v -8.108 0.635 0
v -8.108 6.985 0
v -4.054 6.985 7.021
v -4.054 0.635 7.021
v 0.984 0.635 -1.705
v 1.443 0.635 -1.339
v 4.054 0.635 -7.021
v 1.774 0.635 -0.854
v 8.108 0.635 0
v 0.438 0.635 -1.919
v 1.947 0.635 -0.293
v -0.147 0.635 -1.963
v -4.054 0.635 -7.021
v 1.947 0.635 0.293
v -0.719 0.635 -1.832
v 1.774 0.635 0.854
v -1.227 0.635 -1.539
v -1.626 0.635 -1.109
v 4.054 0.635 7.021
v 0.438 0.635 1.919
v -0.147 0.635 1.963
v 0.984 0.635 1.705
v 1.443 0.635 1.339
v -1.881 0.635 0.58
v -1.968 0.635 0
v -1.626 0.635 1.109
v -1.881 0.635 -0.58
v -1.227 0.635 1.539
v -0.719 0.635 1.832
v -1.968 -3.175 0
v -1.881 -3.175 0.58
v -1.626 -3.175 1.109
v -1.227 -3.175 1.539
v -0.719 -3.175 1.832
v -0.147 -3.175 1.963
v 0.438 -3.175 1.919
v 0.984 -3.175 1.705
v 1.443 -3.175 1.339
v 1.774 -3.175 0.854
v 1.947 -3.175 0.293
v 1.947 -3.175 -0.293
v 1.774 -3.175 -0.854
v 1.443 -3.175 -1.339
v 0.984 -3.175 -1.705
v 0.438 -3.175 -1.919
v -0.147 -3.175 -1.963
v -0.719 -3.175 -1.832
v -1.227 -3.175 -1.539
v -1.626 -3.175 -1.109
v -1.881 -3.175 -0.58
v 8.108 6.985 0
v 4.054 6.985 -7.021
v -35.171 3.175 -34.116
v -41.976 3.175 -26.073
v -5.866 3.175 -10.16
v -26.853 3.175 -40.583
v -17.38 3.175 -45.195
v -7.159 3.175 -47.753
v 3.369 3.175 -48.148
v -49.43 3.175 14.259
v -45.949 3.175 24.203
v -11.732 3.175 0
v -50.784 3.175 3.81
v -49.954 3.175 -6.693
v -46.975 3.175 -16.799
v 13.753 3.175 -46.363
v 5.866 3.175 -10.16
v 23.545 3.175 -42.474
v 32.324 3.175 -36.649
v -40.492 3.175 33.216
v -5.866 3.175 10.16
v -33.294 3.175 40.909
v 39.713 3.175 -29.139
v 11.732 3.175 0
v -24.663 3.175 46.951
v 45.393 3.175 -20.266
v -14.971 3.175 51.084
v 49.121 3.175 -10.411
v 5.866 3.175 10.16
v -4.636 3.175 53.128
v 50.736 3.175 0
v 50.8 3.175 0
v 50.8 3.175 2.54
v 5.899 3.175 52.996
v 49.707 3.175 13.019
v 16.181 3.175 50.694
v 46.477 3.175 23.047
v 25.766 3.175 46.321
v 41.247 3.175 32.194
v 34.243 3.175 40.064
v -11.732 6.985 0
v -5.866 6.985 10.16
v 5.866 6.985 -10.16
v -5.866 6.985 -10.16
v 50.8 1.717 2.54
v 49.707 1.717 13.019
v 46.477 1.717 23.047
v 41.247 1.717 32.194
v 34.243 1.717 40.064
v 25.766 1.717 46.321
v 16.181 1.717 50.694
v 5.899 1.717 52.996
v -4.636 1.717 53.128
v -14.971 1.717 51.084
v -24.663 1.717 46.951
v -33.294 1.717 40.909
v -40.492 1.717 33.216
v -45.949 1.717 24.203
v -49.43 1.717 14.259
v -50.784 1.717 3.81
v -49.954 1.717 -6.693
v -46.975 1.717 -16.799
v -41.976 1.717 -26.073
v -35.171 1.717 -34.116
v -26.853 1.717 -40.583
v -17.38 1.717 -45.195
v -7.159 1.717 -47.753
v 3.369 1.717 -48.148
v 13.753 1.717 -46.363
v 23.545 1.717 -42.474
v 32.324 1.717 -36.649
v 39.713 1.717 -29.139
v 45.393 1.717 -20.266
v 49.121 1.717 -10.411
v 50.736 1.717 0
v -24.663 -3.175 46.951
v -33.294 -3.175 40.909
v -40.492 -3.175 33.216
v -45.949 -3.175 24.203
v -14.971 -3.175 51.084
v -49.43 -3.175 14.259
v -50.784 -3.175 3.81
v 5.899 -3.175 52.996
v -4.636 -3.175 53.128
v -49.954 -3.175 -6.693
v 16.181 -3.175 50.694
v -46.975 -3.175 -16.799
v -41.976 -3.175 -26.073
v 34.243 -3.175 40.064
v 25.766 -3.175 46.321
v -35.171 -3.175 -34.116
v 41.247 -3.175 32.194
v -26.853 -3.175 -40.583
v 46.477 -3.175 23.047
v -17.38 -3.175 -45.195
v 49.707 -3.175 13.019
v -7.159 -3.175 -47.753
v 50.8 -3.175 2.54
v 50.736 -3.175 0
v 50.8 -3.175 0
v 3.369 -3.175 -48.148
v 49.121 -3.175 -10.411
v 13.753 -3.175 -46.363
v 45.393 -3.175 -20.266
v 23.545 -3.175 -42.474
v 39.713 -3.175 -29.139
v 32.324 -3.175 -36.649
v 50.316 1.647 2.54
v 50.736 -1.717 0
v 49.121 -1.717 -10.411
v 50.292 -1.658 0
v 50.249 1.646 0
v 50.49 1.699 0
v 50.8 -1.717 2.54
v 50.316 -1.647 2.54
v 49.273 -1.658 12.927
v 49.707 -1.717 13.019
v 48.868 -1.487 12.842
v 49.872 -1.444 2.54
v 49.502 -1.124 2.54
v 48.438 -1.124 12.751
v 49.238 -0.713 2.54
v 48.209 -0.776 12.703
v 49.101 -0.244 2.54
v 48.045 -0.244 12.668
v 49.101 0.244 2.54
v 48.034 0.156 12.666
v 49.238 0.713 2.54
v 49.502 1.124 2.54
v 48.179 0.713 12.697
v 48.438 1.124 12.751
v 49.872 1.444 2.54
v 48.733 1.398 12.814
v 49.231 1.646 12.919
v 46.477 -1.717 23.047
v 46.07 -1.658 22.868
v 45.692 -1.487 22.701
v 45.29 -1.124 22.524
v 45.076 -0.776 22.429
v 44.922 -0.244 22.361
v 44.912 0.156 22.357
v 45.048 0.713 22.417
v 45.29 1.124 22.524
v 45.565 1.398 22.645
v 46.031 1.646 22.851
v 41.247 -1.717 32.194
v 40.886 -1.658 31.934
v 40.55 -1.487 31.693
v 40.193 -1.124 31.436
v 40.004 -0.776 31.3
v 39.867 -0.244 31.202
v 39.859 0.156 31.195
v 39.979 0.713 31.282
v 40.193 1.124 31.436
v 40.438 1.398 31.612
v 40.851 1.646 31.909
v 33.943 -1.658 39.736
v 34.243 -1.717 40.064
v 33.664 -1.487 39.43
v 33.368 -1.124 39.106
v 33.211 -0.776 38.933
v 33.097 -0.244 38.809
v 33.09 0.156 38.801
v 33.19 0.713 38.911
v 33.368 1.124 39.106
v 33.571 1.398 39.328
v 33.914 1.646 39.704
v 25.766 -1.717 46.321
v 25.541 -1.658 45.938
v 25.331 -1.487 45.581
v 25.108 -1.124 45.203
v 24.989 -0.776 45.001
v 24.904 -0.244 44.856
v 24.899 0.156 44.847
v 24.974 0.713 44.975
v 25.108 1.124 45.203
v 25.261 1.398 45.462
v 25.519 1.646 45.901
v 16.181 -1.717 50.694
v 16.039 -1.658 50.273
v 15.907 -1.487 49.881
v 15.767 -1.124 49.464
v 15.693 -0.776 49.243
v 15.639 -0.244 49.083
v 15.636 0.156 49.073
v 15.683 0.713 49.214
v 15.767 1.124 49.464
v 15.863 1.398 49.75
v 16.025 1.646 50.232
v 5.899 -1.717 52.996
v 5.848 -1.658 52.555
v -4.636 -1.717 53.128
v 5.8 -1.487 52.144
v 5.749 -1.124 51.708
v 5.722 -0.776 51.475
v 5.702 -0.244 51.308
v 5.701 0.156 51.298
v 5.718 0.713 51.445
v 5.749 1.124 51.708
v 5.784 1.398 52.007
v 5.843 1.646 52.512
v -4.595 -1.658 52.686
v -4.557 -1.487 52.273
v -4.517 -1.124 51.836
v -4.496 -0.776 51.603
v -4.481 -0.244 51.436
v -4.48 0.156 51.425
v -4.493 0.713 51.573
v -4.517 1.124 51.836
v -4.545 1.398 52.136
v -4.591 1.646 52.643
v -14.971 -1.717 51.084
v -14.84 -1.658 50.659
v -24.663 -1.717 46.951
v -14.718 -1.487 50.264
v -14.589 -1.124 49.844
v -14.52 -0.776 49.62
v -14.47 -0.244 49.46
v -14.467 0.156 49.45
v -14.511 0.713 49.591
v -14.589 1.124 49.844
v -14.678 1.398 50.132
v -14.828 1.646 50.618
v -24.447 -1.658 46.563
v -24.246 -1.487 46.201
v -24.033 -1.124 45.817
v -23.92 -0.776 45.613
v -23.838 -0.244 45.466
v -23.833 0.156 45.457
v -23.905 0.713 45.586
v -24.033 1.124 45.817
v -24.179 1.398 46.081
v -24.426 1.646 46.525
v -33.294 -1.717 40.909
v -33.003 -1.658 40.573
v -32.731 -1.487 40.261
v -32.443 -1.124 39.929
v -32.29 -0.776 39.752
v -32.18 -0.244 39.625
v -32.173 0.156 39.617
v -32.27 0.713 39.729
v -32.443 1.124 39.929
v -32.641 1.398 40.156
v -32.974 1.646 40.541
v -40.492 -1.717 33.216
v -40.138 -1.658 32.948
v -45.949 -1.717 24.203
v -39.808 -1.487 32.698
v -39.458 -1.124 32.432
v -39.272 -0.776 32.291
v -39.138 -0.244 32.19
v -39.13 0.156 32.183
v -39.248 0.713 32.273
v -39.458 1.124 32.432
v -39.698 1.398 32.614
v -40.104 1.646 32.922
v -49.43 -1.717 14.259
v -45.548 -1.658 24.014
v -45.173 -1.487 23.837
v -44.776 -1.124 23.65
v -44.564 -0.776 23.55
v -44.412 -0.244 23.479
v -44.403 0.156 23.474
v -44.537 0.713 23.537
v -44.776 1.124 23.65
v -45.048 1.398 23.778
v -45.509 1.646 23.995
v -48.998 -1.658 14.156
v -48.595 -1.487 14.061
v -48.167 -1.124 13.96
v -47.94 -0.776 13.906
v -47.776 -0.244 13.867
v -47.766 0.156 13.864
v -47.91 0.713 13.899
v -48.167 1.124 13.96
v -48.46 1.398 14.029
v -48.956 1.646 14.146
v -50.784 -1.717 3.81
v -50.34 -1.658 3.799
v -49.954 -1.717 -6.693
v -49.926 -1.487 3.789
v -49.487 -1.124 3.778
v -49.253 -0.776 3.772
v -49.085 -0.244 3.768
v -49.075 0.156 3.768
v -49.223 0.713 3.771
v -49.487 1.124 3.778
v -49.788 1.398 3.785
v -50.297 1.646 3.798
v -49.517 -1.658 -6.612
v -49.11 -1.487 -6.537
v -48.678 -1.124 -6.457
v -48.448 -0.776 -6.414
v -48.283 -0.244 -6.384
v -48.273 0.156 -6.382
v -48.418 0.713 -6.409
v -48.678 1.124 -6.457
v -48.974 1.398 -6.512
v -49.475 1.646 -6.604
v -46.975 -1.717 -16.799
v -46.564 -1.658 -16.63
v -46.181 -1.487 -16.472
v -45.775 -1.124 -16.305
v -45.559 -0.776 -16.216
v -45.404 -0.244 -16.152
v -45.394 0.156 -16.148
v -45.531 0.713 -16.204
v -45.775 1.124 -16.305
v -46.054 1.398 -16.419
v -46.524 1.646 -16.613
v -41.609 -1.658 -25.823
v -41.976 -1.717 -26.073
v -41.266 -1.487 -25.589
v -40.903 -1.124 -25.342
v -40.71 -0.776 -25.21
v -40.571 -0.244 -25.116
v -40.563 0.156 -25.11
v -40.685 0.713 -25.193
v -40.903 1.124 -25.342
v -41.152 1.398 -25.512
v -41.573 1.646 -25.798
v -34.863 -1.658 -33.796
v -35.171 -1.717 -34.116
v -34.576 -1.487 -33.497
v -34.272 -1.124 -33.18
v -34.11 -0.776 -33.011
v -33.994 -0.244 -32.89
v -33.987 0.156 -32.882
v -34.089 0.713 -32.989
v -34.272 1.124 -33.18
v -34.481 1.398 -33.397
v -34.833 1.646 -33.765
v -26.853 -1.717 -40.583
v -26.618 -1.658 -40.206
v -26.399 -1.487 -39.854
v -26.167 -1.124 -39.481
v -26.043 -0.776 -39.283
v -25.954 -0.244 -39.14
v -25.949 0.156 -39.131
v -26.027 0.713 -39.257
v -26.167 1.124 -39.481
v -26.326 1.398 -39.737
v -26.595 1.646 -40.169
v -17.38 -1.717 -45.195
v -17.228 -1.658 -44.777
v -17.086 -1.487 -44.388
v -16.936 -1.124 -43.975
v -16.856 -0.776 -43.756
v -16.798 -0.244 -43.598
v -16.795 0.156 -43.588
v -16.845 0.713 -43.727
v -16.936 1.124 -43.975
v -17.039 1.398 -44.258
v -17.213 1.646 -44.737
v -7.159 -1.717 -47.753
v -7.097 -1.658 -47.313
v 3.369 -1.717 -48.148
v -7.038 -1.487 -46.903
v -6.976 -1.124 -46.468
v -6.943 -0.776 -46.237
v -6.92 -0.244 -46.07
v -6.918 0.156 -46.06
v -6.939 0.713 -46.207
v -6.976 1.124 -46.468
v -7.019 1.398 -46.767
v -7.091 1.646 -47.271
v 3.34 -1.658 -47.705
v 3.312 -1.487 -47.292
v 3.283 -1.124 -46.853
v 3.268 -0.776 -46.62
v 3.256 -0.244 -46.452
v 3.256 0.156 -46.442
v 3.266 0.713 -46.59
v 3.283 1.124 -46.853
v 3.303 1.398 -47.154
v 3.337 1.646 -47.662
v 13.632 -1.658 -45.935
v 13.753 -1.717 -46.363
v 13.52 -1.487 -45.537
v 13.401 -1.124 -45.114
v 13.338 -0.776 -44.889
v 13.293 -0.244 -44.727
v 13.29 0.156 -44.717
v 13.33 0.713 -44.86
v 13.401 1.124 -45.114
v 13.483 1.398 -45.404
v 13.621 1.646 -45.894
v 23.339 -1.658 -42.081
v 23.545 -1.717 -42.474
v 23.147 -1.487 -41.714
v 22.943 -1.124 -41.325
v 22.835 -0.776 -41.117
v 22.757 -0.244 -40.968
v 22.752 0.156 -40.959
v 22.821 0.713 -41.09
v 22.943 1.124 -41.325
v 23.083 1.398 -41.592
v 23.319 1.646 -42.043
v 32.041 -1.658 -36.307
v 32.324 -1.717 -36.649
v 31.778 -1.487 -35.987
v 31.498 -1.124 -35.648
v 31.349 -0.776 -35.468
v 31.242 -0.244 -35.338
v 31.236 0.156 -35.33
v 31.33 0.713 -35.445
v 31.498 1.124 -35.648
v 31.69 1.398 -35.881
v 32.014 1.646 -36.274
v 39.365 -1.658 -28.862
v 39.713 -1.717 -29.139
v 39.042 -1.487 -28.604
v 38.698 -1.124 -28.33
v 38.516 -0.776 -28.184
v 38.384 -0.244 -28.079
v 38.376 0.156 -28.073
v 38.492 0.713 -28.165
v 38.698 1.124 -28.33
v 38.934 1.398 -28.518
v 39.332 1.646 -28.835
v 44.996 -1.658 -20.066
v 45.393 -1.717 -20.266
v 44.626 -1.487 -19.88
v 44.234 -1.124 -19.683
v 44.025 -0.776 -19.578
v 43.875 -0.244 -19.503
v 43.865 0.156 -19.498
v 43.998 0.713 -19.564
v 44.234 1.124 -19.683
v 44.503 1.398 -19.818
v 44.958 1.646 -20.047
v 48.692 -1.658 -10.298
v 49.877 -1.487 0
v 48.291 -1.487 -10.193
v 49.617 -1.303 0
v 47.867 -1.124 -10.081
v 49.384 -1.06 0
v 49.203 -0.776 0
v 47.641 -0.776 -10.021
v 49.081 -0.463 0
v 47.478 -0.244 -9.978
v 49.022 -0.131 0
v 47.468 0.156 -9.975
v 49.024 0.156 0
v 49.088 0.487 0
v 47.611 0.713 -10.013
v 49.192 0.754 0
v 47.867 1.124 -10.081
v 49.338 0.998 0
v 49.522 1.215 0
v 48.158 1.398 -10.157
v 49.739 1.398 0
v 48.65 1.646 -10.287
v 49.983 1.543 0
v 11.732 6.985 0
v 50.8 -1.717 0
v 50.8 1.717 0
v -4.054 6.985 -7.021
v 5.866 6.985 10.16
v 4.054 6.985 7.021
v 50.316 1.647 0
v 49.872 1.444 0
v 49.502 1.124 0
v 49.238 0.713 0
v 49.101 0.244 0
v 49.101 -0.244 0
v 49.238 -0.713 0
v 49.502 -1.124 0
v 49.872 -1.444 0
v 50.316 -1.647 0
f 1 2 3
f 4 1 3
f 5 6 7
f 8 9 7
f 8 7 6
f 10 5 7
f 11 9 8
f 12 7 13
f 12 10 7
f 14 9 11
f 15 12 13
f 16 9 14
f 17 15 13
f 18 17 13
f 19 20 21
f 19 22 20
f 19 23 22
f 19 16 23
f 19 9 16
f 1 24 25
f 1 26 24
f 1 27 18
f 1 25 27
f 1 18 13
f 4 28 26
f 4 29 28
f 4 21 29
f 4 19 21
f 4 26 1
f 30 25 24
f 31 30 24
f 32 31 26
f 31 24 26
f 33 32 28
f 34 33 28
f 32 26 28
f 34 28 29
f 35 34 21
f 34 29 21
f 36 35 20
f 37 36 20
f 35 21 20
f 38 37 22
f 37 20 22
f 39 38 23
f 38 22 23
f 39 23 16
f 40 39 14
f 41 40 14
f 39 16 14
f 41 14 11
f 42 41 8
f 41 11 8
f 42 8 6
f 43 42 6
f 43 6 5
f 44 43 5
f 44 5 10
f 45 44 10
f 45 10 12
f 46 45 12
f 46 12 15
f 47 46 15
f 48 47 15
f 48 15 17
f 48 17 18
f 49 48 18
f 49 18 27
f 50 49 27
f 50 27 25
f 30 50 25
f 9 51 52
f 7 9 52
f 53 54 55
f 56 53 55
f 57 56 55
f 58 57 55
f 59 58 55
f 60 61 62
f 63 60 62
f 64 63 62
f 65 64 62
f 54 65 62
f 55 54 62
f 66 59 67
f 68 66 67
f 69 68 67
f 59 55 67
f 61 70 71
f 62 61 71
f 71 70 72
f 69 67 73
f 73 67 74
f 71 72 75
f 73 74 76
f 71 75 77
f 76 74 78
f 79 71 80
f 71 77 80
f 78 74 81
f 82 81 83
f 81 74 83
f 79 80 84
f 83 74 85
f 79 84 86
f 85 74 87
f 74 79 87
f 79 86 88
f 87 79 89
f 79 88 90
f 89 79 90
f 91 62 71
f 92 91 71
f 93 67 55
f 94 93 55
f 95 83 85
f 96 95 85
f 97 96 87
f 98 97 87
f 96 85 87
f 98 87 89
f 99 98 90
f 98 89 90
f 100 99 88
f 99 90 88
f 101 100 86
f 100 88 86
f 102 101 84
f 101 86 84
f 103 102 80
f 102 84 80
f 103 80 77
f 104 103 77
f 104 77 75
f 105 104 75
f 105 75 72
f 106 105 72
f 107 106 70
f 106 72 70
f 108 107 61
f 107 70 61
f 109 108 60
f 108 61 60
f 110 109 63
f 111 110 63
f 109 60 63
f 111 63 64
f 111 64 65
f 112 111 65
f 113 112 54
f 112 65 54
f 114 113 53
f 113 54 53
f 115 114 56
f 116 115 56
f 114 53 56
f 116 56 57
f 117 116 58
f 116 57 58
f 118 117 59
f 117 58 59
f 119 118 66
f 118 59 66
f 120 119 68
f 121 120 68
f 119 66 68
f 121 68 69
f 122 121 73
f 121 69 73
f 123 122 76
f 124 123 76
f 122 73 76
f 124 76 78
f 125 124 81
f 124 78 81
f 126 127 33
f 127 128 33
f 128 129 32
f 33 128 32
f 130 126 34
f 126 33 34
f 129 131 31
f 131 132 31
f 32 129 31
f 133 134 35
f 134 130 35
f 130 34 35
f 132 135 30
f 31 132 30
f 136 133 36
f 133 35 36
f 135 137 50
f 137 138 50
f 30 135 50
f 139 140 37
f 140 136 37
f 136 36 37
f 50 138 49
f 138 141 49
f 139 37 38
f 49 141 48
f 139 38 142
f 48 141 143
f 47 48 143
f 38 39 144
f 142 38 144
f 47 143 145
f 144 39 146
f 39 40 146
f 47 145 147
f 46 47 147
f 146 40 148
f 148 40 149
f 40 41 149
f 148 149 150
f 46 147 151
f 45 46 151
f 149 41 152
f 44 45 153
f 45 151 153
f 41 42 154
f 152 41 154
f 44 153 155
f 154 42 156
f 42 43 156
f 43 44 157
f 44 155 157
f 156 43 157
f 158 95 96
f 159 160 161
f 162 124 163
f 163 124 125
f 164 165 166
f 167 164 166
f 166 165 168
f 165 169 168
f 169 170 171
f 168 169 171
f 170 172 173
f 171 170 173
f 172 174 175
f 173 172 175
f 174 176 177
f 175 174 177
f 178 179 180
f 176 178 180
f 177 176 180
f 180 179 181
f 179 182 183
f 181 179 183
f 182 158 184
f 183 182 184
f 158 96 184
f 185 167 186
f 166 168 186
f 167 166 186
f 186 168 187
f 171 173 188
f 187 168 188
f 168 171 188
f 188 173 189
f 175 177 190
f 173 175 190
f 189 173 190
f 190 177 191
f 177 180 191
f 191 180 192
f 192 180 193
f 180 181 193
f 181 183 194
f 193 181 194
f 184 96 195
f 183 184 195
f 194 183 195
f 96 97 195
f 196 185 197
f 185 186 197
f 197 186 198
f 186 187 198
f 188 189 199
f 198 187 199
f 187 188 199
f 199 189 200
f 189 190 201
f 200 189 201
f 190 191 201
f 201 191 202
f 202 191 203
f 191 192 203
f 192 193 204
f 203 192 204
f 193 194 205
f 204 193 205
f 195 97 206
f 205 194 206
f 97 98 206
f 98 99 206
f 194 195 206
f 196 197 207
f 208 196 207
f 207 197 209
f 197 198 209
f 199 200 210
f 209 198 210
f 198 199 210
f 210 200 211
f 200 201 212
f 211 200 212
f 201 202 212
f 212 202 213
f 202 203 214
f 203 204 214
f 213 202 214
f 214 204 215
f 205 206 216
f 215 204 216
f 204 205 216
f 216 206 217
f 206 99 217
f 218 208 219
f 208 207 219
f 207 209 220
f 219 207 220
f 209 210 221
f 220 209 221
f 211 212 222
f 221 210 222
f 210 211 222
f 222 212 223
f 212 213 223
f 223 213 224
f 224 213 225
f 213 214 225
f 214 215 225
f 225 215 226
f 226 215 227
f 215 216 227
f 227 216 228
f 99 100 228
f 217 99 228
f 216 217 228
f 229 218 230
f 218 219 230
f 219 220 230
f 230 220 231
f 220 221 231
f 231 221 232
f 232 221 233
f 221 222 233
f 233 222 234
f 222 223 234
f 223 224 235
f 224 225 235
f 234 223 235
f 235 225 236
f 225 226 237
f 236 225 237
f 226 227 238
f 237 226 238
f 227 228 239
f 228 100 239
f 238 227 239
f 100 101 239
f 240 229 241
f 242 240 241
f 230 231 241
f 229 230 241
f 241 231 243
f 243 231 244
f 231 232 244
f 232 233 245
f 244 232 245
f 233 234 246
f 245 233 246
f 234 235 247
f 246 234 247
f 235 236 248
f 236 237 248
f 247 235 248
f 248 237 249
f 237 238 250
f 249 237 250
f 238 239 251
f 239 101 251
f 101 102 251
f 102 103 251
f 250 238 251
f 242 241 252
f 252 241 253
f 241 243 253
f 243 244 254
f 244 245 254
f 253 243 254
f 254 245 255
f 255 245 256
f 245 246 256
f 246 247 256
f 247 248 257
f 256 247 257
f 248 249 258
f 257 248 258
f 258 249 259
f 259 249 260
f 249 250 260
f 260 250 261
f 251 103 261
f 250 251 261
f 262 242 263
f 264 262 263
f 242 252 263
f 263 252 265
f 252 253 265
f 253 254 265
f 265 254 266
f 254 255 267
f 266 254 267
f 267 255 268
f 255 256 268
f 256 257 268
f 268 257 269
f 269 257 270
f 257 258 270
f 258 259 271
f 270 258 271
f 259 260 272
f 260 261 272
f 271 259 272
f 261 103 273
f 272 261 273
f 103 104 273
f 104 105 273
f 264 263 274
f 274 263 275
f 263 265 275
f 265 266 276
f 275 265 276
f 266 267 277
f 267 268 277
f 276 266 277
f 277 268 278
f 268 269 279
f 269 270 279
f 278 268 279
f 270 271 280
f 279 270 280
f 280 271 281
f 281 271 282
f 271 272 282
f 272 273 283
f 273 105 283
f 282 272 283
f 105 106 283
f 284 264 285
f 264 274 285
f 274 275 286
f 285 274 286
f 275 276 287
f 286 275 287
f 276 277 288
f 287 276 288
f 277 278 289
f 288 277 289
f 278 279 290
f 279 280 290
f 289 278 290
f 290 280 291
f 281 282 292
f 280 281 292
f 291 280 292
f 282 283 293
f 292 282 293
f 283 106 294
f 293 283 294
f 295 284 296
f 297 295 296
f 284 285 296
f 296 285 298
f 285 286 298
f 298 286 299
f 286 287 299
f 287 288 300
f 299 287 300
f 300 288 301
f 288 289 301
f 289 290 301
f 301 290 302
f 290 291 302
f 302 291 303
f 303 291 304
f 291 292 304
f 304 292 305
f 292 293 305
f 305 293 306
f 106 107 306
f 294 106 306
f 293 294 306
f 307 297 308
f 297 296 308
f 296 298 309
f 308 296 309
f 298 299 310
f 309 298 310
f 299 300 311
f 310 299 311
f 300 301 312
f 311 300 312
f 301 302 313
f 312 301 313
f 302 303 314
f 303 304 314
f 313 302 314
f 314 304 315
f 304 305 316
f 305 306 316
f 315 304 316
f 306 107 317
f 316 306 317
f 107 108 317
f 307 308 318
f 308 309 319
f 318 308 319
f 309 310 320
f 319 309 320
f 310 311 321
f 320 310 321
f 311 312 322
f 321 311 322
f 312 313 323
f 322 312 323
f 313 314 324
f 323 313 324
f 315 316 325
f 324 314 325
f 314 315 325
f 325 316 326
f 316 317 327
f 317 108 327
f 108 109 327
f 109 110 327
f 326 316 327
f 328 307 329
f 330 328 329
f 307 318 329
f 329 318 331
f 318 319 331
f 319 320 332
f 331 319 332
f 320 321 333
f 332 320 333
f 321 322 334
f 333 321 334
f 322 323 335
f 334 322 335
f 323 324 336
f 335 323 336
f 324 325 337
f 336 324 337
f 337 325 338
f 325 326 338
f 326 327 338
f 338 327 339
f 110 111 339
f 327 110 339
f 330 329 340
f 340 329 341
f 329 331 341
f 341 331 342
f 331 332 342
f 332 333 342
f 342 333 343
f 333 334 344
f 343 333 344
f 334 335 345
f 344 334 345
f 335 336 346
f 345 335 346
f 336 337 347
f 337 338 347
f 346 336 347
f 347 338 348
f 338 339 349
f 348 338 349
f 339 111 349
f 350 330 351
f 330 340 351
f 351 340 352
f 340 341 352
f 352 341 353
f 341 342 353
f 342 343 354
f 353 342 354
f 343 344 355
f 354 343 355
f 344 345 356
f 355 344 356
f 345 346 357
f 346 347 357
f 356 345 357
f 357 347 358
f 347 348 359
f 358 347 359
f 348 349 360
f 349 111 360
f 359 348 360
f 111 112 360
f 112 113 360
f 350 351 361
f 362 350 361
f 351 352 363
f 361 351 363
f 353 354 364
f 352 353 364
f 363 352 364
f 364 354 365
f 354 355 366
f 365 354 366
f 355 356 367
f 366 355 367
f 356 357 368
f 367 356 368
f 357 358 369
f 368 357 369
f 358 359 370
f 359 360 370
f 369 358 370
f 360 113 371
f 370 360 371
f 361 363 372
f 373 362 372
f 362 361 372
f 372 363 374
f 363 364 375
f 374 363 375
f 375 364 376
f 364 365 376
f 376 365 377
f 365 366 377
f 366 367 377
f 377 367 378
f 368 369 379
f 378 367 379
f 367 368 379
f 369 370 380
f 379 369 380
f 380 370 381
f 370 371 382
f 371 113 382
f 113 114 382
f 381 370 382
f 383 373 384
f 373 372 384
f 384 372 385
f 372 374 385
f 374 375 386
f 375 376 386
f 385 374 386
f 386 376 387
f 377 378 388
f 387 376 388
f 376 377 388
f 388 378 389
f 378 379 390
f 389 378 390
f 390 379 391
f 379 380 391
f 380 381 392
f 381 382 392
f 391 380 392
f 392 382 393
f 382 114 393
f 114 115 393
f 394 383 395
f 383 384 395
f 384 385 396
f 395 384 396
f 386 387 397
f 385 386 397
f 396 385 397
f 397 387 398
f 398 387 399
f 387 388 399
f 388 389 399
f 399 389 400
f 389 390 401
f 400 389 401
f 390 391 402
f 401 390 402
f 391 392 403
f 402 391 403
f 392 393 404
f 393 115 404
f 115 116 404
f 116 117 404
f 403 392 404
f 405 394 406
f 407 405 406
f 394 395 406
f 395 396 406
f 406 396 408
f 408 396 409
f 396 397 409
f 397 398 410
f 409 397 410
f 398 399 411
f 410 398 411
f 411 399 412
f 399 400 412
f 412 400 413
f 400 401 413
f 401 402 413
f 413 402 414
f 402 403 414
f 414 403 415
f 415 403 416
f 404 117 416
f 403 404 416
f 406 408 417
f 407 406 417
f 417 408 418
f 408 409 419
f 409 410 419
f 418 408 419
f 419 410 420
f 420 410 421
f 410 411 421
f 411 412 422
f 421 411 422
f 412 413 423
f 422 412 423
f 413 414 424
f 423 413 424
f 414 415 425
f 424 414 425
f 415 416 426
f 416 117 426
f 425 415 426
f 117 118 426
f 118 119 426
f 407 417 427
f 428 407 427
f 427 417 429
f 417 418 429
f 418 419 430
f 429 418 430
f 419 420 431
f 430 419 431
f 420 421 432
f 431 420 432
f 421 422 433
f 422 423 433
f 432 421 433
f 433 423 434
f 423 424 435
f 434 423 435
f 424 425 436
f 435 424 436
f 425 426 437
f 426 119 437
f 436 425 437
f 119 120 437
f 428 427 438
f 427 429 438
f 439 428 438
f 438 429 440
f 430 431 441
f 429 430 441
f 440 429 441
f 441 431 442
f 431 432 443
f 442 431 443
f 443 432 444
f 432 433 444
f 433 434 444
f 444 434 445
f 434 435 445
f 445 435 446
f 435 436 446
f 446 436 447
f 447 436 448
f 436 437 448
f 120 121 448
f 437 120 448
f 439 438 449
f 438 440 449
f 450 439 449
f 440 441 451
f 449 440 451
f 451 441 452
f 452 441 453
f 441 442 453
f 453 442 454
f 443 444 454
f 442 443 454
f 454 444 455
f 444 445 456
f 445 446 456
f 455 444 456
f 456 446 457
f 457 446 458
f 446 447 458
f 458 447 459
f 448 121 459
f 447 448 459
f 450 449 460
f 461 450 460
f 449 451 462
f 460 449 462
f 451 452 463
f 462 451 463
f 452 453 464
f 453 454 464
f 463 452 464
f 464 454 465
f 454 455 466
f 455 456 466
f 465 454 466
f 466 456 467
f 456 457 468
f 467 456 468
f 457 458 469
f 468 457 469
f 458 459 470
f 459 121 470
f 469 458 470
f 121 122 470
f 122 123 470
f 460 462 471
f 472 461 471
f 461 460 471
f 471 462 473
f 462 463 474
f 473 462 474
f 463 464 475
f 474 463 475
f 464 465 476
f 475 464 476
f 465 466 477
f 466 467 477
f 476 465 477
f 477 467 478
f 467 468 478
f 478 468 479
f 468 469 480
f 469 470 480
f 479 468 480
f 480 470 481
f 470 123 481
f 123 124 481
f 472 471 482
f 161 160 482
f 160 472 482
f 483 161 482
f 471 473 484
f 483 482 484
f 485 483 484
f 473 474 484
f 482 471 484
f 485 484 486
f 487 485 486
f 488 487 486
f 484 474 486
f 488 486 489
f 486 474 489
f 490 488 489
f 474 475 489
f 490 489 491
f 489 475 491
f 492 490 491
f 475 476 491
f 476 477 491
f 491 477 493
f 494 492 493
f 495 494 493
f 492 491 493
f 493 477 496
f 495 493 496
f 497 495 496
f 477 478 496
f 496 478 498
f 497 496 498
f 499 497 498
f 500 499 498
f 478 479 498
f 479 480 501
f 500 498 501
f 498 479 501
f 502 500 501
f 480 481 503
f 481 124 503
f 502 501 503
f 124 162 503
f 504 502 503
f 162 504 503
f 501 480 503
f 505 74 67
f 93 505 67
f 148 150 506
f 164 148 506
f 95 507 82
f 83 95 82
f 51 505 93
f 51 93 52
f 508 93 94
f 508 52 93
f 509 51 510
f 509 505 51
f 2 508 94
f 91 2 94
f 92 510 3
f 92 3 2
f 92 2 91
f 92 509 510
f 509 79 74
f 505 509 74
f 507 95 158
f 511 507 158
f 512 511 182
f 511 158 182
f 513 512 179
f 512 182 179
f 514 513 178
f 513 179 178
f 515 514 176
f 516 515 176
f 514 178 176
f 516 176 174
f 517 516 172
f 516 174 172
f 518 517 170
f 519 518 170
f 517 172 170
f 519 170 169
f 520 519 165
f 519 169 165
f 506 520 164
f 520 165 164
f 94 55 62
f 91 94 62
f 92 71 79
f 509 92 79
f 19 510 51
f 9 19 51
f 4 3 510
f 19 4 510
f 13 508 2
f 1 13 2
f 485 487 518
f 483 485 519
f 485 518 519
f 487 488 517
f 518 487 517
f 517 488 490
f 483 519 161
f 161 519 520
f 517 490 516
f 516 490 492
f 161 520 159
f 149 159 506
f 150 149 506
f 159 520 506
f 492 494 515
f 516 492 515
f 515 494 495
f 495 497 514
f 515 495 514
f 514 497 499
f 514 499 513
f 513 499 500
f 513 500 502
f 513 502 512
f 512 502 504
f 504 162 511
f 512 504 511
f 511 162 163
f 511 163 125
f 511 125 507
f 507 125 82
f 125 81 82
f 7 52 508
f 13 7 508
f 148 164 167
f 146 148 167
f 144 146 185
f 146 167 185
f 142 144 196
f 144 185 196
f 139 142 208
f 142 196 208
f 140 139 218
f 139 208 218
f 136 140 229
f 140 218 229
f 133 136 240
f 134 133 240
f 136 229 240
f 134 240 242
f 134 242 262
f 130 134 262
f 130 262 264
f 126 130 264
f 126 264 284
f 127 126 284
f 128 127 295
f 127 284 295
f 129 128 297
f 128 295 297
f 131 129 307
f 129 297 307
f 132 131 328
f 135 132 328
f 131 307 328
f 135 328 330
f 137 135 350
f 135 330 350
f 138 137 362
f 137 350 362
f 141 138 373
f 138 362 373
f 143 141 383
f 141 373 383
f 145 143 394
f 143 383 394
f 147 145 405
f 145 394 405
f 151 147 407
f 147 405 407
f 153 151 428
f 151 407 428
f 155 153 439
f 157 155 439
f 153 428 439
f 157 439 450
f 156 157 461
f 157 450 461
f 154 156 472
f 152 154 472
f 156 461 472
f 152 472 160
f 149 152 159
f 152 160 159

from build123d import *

# Parameters (mm, degrees)
F0_W      = 50.8
F0_H      = 6.35
F1_DEPTH  = 2.54
F3_DEPTH  = 2.54
F6_DEPTH  = 3.81
F8_DEPTH  = 6.35
F9_R      = 1.9685
F10_DEPTH = 6.35


with BuildPart() as f1:
    # F0 (on Top) → F1 (new body)
    with BuildSketch(Plane.XY):
        with Locations((25.4, 0)):
            Rectangle(F0_W, F0_H)
    extrude(amount=F1_DEPTH)

    # F2 (on face) → F3 (cut)
    with BuildSketch(Plane.XY.offset(2.54)):
        with BuildLine():
            Line((50.8, -1.716926), (50.8, 1.716926))
            ThreePointArc((50.8, 1.716926), (49.083074, 0), (50.8, -1.716926))
        make_face()
    extrude(amount=-F3_DEPTH, mode=Mode.SUBTRACT)

    # F1_face (on face) → F4 (revolve)
    with BuildSketch(Plane(origin=(25.4, 0, 2.54), x_dir=(1, 0, 0), z_dir=(0, 0, 1))):
        with BuildLine():
            Line((25.4, 1.716926), (25.4, 3.175))
            Line((25.4, 3.175), (-25.4, 3.175))
            Line((-25.4, 3.175), (-25.4, -3.175))
            Line((-25.4, -3.175), (25.4, -3.175))
            Line((25.4, -3.175), (25.4, -1.716926))
            ThreePointArc((25.4, -1.716926), (23.683074, 0), (25.4, 1.716926))
        make_face()
    revolve(axis=Axis((0, 0, 2.54), (0, -1, 0)))

    # F5 (on face) → F6 (join)
    with BuildSketch(Plane(origin=(0, 3.175, 0), x_dir=(-1, 0, 0), z_dir=(0, 1, 0))):
        Polygon((5.865879, 10.16), (-5.865879, 10.16), (-11.731757, 0), (-5.865879, -10.16), (5.865879, -10.16), (11.731757, 0), align=None)
    extrude(amount=F6_DEPTH)

    # F7 (on face) → F8 (cut)
    with BuildSketch(Plane(origin=(0, 6.985, 0), x_dir=(-1, 0, 0), z_dir=(0, 1, 0))):
        Polygon((4.05375, 7.021301), (-4.05375, 7.021301), (-8.107501, 0), (-4.05375, -7.021301), (4.05375, -7.021301), (8.107501, 0), align=None)
    extrude(amount=-F8_DEPTH, mode=Mode.SUBTRACT)

    # F9 (on face) → F10 (cut)
    with BuildSketch(Plane(origin=(0, 0.635, 0), x_dir=(-1, 0, 0), z_dir=(0, 1, 0))):
        Circle(F9_R)
    extrude(amount=-F10_DEPTH, mode=Mode.SUBTRACT)


solid = f1.part
